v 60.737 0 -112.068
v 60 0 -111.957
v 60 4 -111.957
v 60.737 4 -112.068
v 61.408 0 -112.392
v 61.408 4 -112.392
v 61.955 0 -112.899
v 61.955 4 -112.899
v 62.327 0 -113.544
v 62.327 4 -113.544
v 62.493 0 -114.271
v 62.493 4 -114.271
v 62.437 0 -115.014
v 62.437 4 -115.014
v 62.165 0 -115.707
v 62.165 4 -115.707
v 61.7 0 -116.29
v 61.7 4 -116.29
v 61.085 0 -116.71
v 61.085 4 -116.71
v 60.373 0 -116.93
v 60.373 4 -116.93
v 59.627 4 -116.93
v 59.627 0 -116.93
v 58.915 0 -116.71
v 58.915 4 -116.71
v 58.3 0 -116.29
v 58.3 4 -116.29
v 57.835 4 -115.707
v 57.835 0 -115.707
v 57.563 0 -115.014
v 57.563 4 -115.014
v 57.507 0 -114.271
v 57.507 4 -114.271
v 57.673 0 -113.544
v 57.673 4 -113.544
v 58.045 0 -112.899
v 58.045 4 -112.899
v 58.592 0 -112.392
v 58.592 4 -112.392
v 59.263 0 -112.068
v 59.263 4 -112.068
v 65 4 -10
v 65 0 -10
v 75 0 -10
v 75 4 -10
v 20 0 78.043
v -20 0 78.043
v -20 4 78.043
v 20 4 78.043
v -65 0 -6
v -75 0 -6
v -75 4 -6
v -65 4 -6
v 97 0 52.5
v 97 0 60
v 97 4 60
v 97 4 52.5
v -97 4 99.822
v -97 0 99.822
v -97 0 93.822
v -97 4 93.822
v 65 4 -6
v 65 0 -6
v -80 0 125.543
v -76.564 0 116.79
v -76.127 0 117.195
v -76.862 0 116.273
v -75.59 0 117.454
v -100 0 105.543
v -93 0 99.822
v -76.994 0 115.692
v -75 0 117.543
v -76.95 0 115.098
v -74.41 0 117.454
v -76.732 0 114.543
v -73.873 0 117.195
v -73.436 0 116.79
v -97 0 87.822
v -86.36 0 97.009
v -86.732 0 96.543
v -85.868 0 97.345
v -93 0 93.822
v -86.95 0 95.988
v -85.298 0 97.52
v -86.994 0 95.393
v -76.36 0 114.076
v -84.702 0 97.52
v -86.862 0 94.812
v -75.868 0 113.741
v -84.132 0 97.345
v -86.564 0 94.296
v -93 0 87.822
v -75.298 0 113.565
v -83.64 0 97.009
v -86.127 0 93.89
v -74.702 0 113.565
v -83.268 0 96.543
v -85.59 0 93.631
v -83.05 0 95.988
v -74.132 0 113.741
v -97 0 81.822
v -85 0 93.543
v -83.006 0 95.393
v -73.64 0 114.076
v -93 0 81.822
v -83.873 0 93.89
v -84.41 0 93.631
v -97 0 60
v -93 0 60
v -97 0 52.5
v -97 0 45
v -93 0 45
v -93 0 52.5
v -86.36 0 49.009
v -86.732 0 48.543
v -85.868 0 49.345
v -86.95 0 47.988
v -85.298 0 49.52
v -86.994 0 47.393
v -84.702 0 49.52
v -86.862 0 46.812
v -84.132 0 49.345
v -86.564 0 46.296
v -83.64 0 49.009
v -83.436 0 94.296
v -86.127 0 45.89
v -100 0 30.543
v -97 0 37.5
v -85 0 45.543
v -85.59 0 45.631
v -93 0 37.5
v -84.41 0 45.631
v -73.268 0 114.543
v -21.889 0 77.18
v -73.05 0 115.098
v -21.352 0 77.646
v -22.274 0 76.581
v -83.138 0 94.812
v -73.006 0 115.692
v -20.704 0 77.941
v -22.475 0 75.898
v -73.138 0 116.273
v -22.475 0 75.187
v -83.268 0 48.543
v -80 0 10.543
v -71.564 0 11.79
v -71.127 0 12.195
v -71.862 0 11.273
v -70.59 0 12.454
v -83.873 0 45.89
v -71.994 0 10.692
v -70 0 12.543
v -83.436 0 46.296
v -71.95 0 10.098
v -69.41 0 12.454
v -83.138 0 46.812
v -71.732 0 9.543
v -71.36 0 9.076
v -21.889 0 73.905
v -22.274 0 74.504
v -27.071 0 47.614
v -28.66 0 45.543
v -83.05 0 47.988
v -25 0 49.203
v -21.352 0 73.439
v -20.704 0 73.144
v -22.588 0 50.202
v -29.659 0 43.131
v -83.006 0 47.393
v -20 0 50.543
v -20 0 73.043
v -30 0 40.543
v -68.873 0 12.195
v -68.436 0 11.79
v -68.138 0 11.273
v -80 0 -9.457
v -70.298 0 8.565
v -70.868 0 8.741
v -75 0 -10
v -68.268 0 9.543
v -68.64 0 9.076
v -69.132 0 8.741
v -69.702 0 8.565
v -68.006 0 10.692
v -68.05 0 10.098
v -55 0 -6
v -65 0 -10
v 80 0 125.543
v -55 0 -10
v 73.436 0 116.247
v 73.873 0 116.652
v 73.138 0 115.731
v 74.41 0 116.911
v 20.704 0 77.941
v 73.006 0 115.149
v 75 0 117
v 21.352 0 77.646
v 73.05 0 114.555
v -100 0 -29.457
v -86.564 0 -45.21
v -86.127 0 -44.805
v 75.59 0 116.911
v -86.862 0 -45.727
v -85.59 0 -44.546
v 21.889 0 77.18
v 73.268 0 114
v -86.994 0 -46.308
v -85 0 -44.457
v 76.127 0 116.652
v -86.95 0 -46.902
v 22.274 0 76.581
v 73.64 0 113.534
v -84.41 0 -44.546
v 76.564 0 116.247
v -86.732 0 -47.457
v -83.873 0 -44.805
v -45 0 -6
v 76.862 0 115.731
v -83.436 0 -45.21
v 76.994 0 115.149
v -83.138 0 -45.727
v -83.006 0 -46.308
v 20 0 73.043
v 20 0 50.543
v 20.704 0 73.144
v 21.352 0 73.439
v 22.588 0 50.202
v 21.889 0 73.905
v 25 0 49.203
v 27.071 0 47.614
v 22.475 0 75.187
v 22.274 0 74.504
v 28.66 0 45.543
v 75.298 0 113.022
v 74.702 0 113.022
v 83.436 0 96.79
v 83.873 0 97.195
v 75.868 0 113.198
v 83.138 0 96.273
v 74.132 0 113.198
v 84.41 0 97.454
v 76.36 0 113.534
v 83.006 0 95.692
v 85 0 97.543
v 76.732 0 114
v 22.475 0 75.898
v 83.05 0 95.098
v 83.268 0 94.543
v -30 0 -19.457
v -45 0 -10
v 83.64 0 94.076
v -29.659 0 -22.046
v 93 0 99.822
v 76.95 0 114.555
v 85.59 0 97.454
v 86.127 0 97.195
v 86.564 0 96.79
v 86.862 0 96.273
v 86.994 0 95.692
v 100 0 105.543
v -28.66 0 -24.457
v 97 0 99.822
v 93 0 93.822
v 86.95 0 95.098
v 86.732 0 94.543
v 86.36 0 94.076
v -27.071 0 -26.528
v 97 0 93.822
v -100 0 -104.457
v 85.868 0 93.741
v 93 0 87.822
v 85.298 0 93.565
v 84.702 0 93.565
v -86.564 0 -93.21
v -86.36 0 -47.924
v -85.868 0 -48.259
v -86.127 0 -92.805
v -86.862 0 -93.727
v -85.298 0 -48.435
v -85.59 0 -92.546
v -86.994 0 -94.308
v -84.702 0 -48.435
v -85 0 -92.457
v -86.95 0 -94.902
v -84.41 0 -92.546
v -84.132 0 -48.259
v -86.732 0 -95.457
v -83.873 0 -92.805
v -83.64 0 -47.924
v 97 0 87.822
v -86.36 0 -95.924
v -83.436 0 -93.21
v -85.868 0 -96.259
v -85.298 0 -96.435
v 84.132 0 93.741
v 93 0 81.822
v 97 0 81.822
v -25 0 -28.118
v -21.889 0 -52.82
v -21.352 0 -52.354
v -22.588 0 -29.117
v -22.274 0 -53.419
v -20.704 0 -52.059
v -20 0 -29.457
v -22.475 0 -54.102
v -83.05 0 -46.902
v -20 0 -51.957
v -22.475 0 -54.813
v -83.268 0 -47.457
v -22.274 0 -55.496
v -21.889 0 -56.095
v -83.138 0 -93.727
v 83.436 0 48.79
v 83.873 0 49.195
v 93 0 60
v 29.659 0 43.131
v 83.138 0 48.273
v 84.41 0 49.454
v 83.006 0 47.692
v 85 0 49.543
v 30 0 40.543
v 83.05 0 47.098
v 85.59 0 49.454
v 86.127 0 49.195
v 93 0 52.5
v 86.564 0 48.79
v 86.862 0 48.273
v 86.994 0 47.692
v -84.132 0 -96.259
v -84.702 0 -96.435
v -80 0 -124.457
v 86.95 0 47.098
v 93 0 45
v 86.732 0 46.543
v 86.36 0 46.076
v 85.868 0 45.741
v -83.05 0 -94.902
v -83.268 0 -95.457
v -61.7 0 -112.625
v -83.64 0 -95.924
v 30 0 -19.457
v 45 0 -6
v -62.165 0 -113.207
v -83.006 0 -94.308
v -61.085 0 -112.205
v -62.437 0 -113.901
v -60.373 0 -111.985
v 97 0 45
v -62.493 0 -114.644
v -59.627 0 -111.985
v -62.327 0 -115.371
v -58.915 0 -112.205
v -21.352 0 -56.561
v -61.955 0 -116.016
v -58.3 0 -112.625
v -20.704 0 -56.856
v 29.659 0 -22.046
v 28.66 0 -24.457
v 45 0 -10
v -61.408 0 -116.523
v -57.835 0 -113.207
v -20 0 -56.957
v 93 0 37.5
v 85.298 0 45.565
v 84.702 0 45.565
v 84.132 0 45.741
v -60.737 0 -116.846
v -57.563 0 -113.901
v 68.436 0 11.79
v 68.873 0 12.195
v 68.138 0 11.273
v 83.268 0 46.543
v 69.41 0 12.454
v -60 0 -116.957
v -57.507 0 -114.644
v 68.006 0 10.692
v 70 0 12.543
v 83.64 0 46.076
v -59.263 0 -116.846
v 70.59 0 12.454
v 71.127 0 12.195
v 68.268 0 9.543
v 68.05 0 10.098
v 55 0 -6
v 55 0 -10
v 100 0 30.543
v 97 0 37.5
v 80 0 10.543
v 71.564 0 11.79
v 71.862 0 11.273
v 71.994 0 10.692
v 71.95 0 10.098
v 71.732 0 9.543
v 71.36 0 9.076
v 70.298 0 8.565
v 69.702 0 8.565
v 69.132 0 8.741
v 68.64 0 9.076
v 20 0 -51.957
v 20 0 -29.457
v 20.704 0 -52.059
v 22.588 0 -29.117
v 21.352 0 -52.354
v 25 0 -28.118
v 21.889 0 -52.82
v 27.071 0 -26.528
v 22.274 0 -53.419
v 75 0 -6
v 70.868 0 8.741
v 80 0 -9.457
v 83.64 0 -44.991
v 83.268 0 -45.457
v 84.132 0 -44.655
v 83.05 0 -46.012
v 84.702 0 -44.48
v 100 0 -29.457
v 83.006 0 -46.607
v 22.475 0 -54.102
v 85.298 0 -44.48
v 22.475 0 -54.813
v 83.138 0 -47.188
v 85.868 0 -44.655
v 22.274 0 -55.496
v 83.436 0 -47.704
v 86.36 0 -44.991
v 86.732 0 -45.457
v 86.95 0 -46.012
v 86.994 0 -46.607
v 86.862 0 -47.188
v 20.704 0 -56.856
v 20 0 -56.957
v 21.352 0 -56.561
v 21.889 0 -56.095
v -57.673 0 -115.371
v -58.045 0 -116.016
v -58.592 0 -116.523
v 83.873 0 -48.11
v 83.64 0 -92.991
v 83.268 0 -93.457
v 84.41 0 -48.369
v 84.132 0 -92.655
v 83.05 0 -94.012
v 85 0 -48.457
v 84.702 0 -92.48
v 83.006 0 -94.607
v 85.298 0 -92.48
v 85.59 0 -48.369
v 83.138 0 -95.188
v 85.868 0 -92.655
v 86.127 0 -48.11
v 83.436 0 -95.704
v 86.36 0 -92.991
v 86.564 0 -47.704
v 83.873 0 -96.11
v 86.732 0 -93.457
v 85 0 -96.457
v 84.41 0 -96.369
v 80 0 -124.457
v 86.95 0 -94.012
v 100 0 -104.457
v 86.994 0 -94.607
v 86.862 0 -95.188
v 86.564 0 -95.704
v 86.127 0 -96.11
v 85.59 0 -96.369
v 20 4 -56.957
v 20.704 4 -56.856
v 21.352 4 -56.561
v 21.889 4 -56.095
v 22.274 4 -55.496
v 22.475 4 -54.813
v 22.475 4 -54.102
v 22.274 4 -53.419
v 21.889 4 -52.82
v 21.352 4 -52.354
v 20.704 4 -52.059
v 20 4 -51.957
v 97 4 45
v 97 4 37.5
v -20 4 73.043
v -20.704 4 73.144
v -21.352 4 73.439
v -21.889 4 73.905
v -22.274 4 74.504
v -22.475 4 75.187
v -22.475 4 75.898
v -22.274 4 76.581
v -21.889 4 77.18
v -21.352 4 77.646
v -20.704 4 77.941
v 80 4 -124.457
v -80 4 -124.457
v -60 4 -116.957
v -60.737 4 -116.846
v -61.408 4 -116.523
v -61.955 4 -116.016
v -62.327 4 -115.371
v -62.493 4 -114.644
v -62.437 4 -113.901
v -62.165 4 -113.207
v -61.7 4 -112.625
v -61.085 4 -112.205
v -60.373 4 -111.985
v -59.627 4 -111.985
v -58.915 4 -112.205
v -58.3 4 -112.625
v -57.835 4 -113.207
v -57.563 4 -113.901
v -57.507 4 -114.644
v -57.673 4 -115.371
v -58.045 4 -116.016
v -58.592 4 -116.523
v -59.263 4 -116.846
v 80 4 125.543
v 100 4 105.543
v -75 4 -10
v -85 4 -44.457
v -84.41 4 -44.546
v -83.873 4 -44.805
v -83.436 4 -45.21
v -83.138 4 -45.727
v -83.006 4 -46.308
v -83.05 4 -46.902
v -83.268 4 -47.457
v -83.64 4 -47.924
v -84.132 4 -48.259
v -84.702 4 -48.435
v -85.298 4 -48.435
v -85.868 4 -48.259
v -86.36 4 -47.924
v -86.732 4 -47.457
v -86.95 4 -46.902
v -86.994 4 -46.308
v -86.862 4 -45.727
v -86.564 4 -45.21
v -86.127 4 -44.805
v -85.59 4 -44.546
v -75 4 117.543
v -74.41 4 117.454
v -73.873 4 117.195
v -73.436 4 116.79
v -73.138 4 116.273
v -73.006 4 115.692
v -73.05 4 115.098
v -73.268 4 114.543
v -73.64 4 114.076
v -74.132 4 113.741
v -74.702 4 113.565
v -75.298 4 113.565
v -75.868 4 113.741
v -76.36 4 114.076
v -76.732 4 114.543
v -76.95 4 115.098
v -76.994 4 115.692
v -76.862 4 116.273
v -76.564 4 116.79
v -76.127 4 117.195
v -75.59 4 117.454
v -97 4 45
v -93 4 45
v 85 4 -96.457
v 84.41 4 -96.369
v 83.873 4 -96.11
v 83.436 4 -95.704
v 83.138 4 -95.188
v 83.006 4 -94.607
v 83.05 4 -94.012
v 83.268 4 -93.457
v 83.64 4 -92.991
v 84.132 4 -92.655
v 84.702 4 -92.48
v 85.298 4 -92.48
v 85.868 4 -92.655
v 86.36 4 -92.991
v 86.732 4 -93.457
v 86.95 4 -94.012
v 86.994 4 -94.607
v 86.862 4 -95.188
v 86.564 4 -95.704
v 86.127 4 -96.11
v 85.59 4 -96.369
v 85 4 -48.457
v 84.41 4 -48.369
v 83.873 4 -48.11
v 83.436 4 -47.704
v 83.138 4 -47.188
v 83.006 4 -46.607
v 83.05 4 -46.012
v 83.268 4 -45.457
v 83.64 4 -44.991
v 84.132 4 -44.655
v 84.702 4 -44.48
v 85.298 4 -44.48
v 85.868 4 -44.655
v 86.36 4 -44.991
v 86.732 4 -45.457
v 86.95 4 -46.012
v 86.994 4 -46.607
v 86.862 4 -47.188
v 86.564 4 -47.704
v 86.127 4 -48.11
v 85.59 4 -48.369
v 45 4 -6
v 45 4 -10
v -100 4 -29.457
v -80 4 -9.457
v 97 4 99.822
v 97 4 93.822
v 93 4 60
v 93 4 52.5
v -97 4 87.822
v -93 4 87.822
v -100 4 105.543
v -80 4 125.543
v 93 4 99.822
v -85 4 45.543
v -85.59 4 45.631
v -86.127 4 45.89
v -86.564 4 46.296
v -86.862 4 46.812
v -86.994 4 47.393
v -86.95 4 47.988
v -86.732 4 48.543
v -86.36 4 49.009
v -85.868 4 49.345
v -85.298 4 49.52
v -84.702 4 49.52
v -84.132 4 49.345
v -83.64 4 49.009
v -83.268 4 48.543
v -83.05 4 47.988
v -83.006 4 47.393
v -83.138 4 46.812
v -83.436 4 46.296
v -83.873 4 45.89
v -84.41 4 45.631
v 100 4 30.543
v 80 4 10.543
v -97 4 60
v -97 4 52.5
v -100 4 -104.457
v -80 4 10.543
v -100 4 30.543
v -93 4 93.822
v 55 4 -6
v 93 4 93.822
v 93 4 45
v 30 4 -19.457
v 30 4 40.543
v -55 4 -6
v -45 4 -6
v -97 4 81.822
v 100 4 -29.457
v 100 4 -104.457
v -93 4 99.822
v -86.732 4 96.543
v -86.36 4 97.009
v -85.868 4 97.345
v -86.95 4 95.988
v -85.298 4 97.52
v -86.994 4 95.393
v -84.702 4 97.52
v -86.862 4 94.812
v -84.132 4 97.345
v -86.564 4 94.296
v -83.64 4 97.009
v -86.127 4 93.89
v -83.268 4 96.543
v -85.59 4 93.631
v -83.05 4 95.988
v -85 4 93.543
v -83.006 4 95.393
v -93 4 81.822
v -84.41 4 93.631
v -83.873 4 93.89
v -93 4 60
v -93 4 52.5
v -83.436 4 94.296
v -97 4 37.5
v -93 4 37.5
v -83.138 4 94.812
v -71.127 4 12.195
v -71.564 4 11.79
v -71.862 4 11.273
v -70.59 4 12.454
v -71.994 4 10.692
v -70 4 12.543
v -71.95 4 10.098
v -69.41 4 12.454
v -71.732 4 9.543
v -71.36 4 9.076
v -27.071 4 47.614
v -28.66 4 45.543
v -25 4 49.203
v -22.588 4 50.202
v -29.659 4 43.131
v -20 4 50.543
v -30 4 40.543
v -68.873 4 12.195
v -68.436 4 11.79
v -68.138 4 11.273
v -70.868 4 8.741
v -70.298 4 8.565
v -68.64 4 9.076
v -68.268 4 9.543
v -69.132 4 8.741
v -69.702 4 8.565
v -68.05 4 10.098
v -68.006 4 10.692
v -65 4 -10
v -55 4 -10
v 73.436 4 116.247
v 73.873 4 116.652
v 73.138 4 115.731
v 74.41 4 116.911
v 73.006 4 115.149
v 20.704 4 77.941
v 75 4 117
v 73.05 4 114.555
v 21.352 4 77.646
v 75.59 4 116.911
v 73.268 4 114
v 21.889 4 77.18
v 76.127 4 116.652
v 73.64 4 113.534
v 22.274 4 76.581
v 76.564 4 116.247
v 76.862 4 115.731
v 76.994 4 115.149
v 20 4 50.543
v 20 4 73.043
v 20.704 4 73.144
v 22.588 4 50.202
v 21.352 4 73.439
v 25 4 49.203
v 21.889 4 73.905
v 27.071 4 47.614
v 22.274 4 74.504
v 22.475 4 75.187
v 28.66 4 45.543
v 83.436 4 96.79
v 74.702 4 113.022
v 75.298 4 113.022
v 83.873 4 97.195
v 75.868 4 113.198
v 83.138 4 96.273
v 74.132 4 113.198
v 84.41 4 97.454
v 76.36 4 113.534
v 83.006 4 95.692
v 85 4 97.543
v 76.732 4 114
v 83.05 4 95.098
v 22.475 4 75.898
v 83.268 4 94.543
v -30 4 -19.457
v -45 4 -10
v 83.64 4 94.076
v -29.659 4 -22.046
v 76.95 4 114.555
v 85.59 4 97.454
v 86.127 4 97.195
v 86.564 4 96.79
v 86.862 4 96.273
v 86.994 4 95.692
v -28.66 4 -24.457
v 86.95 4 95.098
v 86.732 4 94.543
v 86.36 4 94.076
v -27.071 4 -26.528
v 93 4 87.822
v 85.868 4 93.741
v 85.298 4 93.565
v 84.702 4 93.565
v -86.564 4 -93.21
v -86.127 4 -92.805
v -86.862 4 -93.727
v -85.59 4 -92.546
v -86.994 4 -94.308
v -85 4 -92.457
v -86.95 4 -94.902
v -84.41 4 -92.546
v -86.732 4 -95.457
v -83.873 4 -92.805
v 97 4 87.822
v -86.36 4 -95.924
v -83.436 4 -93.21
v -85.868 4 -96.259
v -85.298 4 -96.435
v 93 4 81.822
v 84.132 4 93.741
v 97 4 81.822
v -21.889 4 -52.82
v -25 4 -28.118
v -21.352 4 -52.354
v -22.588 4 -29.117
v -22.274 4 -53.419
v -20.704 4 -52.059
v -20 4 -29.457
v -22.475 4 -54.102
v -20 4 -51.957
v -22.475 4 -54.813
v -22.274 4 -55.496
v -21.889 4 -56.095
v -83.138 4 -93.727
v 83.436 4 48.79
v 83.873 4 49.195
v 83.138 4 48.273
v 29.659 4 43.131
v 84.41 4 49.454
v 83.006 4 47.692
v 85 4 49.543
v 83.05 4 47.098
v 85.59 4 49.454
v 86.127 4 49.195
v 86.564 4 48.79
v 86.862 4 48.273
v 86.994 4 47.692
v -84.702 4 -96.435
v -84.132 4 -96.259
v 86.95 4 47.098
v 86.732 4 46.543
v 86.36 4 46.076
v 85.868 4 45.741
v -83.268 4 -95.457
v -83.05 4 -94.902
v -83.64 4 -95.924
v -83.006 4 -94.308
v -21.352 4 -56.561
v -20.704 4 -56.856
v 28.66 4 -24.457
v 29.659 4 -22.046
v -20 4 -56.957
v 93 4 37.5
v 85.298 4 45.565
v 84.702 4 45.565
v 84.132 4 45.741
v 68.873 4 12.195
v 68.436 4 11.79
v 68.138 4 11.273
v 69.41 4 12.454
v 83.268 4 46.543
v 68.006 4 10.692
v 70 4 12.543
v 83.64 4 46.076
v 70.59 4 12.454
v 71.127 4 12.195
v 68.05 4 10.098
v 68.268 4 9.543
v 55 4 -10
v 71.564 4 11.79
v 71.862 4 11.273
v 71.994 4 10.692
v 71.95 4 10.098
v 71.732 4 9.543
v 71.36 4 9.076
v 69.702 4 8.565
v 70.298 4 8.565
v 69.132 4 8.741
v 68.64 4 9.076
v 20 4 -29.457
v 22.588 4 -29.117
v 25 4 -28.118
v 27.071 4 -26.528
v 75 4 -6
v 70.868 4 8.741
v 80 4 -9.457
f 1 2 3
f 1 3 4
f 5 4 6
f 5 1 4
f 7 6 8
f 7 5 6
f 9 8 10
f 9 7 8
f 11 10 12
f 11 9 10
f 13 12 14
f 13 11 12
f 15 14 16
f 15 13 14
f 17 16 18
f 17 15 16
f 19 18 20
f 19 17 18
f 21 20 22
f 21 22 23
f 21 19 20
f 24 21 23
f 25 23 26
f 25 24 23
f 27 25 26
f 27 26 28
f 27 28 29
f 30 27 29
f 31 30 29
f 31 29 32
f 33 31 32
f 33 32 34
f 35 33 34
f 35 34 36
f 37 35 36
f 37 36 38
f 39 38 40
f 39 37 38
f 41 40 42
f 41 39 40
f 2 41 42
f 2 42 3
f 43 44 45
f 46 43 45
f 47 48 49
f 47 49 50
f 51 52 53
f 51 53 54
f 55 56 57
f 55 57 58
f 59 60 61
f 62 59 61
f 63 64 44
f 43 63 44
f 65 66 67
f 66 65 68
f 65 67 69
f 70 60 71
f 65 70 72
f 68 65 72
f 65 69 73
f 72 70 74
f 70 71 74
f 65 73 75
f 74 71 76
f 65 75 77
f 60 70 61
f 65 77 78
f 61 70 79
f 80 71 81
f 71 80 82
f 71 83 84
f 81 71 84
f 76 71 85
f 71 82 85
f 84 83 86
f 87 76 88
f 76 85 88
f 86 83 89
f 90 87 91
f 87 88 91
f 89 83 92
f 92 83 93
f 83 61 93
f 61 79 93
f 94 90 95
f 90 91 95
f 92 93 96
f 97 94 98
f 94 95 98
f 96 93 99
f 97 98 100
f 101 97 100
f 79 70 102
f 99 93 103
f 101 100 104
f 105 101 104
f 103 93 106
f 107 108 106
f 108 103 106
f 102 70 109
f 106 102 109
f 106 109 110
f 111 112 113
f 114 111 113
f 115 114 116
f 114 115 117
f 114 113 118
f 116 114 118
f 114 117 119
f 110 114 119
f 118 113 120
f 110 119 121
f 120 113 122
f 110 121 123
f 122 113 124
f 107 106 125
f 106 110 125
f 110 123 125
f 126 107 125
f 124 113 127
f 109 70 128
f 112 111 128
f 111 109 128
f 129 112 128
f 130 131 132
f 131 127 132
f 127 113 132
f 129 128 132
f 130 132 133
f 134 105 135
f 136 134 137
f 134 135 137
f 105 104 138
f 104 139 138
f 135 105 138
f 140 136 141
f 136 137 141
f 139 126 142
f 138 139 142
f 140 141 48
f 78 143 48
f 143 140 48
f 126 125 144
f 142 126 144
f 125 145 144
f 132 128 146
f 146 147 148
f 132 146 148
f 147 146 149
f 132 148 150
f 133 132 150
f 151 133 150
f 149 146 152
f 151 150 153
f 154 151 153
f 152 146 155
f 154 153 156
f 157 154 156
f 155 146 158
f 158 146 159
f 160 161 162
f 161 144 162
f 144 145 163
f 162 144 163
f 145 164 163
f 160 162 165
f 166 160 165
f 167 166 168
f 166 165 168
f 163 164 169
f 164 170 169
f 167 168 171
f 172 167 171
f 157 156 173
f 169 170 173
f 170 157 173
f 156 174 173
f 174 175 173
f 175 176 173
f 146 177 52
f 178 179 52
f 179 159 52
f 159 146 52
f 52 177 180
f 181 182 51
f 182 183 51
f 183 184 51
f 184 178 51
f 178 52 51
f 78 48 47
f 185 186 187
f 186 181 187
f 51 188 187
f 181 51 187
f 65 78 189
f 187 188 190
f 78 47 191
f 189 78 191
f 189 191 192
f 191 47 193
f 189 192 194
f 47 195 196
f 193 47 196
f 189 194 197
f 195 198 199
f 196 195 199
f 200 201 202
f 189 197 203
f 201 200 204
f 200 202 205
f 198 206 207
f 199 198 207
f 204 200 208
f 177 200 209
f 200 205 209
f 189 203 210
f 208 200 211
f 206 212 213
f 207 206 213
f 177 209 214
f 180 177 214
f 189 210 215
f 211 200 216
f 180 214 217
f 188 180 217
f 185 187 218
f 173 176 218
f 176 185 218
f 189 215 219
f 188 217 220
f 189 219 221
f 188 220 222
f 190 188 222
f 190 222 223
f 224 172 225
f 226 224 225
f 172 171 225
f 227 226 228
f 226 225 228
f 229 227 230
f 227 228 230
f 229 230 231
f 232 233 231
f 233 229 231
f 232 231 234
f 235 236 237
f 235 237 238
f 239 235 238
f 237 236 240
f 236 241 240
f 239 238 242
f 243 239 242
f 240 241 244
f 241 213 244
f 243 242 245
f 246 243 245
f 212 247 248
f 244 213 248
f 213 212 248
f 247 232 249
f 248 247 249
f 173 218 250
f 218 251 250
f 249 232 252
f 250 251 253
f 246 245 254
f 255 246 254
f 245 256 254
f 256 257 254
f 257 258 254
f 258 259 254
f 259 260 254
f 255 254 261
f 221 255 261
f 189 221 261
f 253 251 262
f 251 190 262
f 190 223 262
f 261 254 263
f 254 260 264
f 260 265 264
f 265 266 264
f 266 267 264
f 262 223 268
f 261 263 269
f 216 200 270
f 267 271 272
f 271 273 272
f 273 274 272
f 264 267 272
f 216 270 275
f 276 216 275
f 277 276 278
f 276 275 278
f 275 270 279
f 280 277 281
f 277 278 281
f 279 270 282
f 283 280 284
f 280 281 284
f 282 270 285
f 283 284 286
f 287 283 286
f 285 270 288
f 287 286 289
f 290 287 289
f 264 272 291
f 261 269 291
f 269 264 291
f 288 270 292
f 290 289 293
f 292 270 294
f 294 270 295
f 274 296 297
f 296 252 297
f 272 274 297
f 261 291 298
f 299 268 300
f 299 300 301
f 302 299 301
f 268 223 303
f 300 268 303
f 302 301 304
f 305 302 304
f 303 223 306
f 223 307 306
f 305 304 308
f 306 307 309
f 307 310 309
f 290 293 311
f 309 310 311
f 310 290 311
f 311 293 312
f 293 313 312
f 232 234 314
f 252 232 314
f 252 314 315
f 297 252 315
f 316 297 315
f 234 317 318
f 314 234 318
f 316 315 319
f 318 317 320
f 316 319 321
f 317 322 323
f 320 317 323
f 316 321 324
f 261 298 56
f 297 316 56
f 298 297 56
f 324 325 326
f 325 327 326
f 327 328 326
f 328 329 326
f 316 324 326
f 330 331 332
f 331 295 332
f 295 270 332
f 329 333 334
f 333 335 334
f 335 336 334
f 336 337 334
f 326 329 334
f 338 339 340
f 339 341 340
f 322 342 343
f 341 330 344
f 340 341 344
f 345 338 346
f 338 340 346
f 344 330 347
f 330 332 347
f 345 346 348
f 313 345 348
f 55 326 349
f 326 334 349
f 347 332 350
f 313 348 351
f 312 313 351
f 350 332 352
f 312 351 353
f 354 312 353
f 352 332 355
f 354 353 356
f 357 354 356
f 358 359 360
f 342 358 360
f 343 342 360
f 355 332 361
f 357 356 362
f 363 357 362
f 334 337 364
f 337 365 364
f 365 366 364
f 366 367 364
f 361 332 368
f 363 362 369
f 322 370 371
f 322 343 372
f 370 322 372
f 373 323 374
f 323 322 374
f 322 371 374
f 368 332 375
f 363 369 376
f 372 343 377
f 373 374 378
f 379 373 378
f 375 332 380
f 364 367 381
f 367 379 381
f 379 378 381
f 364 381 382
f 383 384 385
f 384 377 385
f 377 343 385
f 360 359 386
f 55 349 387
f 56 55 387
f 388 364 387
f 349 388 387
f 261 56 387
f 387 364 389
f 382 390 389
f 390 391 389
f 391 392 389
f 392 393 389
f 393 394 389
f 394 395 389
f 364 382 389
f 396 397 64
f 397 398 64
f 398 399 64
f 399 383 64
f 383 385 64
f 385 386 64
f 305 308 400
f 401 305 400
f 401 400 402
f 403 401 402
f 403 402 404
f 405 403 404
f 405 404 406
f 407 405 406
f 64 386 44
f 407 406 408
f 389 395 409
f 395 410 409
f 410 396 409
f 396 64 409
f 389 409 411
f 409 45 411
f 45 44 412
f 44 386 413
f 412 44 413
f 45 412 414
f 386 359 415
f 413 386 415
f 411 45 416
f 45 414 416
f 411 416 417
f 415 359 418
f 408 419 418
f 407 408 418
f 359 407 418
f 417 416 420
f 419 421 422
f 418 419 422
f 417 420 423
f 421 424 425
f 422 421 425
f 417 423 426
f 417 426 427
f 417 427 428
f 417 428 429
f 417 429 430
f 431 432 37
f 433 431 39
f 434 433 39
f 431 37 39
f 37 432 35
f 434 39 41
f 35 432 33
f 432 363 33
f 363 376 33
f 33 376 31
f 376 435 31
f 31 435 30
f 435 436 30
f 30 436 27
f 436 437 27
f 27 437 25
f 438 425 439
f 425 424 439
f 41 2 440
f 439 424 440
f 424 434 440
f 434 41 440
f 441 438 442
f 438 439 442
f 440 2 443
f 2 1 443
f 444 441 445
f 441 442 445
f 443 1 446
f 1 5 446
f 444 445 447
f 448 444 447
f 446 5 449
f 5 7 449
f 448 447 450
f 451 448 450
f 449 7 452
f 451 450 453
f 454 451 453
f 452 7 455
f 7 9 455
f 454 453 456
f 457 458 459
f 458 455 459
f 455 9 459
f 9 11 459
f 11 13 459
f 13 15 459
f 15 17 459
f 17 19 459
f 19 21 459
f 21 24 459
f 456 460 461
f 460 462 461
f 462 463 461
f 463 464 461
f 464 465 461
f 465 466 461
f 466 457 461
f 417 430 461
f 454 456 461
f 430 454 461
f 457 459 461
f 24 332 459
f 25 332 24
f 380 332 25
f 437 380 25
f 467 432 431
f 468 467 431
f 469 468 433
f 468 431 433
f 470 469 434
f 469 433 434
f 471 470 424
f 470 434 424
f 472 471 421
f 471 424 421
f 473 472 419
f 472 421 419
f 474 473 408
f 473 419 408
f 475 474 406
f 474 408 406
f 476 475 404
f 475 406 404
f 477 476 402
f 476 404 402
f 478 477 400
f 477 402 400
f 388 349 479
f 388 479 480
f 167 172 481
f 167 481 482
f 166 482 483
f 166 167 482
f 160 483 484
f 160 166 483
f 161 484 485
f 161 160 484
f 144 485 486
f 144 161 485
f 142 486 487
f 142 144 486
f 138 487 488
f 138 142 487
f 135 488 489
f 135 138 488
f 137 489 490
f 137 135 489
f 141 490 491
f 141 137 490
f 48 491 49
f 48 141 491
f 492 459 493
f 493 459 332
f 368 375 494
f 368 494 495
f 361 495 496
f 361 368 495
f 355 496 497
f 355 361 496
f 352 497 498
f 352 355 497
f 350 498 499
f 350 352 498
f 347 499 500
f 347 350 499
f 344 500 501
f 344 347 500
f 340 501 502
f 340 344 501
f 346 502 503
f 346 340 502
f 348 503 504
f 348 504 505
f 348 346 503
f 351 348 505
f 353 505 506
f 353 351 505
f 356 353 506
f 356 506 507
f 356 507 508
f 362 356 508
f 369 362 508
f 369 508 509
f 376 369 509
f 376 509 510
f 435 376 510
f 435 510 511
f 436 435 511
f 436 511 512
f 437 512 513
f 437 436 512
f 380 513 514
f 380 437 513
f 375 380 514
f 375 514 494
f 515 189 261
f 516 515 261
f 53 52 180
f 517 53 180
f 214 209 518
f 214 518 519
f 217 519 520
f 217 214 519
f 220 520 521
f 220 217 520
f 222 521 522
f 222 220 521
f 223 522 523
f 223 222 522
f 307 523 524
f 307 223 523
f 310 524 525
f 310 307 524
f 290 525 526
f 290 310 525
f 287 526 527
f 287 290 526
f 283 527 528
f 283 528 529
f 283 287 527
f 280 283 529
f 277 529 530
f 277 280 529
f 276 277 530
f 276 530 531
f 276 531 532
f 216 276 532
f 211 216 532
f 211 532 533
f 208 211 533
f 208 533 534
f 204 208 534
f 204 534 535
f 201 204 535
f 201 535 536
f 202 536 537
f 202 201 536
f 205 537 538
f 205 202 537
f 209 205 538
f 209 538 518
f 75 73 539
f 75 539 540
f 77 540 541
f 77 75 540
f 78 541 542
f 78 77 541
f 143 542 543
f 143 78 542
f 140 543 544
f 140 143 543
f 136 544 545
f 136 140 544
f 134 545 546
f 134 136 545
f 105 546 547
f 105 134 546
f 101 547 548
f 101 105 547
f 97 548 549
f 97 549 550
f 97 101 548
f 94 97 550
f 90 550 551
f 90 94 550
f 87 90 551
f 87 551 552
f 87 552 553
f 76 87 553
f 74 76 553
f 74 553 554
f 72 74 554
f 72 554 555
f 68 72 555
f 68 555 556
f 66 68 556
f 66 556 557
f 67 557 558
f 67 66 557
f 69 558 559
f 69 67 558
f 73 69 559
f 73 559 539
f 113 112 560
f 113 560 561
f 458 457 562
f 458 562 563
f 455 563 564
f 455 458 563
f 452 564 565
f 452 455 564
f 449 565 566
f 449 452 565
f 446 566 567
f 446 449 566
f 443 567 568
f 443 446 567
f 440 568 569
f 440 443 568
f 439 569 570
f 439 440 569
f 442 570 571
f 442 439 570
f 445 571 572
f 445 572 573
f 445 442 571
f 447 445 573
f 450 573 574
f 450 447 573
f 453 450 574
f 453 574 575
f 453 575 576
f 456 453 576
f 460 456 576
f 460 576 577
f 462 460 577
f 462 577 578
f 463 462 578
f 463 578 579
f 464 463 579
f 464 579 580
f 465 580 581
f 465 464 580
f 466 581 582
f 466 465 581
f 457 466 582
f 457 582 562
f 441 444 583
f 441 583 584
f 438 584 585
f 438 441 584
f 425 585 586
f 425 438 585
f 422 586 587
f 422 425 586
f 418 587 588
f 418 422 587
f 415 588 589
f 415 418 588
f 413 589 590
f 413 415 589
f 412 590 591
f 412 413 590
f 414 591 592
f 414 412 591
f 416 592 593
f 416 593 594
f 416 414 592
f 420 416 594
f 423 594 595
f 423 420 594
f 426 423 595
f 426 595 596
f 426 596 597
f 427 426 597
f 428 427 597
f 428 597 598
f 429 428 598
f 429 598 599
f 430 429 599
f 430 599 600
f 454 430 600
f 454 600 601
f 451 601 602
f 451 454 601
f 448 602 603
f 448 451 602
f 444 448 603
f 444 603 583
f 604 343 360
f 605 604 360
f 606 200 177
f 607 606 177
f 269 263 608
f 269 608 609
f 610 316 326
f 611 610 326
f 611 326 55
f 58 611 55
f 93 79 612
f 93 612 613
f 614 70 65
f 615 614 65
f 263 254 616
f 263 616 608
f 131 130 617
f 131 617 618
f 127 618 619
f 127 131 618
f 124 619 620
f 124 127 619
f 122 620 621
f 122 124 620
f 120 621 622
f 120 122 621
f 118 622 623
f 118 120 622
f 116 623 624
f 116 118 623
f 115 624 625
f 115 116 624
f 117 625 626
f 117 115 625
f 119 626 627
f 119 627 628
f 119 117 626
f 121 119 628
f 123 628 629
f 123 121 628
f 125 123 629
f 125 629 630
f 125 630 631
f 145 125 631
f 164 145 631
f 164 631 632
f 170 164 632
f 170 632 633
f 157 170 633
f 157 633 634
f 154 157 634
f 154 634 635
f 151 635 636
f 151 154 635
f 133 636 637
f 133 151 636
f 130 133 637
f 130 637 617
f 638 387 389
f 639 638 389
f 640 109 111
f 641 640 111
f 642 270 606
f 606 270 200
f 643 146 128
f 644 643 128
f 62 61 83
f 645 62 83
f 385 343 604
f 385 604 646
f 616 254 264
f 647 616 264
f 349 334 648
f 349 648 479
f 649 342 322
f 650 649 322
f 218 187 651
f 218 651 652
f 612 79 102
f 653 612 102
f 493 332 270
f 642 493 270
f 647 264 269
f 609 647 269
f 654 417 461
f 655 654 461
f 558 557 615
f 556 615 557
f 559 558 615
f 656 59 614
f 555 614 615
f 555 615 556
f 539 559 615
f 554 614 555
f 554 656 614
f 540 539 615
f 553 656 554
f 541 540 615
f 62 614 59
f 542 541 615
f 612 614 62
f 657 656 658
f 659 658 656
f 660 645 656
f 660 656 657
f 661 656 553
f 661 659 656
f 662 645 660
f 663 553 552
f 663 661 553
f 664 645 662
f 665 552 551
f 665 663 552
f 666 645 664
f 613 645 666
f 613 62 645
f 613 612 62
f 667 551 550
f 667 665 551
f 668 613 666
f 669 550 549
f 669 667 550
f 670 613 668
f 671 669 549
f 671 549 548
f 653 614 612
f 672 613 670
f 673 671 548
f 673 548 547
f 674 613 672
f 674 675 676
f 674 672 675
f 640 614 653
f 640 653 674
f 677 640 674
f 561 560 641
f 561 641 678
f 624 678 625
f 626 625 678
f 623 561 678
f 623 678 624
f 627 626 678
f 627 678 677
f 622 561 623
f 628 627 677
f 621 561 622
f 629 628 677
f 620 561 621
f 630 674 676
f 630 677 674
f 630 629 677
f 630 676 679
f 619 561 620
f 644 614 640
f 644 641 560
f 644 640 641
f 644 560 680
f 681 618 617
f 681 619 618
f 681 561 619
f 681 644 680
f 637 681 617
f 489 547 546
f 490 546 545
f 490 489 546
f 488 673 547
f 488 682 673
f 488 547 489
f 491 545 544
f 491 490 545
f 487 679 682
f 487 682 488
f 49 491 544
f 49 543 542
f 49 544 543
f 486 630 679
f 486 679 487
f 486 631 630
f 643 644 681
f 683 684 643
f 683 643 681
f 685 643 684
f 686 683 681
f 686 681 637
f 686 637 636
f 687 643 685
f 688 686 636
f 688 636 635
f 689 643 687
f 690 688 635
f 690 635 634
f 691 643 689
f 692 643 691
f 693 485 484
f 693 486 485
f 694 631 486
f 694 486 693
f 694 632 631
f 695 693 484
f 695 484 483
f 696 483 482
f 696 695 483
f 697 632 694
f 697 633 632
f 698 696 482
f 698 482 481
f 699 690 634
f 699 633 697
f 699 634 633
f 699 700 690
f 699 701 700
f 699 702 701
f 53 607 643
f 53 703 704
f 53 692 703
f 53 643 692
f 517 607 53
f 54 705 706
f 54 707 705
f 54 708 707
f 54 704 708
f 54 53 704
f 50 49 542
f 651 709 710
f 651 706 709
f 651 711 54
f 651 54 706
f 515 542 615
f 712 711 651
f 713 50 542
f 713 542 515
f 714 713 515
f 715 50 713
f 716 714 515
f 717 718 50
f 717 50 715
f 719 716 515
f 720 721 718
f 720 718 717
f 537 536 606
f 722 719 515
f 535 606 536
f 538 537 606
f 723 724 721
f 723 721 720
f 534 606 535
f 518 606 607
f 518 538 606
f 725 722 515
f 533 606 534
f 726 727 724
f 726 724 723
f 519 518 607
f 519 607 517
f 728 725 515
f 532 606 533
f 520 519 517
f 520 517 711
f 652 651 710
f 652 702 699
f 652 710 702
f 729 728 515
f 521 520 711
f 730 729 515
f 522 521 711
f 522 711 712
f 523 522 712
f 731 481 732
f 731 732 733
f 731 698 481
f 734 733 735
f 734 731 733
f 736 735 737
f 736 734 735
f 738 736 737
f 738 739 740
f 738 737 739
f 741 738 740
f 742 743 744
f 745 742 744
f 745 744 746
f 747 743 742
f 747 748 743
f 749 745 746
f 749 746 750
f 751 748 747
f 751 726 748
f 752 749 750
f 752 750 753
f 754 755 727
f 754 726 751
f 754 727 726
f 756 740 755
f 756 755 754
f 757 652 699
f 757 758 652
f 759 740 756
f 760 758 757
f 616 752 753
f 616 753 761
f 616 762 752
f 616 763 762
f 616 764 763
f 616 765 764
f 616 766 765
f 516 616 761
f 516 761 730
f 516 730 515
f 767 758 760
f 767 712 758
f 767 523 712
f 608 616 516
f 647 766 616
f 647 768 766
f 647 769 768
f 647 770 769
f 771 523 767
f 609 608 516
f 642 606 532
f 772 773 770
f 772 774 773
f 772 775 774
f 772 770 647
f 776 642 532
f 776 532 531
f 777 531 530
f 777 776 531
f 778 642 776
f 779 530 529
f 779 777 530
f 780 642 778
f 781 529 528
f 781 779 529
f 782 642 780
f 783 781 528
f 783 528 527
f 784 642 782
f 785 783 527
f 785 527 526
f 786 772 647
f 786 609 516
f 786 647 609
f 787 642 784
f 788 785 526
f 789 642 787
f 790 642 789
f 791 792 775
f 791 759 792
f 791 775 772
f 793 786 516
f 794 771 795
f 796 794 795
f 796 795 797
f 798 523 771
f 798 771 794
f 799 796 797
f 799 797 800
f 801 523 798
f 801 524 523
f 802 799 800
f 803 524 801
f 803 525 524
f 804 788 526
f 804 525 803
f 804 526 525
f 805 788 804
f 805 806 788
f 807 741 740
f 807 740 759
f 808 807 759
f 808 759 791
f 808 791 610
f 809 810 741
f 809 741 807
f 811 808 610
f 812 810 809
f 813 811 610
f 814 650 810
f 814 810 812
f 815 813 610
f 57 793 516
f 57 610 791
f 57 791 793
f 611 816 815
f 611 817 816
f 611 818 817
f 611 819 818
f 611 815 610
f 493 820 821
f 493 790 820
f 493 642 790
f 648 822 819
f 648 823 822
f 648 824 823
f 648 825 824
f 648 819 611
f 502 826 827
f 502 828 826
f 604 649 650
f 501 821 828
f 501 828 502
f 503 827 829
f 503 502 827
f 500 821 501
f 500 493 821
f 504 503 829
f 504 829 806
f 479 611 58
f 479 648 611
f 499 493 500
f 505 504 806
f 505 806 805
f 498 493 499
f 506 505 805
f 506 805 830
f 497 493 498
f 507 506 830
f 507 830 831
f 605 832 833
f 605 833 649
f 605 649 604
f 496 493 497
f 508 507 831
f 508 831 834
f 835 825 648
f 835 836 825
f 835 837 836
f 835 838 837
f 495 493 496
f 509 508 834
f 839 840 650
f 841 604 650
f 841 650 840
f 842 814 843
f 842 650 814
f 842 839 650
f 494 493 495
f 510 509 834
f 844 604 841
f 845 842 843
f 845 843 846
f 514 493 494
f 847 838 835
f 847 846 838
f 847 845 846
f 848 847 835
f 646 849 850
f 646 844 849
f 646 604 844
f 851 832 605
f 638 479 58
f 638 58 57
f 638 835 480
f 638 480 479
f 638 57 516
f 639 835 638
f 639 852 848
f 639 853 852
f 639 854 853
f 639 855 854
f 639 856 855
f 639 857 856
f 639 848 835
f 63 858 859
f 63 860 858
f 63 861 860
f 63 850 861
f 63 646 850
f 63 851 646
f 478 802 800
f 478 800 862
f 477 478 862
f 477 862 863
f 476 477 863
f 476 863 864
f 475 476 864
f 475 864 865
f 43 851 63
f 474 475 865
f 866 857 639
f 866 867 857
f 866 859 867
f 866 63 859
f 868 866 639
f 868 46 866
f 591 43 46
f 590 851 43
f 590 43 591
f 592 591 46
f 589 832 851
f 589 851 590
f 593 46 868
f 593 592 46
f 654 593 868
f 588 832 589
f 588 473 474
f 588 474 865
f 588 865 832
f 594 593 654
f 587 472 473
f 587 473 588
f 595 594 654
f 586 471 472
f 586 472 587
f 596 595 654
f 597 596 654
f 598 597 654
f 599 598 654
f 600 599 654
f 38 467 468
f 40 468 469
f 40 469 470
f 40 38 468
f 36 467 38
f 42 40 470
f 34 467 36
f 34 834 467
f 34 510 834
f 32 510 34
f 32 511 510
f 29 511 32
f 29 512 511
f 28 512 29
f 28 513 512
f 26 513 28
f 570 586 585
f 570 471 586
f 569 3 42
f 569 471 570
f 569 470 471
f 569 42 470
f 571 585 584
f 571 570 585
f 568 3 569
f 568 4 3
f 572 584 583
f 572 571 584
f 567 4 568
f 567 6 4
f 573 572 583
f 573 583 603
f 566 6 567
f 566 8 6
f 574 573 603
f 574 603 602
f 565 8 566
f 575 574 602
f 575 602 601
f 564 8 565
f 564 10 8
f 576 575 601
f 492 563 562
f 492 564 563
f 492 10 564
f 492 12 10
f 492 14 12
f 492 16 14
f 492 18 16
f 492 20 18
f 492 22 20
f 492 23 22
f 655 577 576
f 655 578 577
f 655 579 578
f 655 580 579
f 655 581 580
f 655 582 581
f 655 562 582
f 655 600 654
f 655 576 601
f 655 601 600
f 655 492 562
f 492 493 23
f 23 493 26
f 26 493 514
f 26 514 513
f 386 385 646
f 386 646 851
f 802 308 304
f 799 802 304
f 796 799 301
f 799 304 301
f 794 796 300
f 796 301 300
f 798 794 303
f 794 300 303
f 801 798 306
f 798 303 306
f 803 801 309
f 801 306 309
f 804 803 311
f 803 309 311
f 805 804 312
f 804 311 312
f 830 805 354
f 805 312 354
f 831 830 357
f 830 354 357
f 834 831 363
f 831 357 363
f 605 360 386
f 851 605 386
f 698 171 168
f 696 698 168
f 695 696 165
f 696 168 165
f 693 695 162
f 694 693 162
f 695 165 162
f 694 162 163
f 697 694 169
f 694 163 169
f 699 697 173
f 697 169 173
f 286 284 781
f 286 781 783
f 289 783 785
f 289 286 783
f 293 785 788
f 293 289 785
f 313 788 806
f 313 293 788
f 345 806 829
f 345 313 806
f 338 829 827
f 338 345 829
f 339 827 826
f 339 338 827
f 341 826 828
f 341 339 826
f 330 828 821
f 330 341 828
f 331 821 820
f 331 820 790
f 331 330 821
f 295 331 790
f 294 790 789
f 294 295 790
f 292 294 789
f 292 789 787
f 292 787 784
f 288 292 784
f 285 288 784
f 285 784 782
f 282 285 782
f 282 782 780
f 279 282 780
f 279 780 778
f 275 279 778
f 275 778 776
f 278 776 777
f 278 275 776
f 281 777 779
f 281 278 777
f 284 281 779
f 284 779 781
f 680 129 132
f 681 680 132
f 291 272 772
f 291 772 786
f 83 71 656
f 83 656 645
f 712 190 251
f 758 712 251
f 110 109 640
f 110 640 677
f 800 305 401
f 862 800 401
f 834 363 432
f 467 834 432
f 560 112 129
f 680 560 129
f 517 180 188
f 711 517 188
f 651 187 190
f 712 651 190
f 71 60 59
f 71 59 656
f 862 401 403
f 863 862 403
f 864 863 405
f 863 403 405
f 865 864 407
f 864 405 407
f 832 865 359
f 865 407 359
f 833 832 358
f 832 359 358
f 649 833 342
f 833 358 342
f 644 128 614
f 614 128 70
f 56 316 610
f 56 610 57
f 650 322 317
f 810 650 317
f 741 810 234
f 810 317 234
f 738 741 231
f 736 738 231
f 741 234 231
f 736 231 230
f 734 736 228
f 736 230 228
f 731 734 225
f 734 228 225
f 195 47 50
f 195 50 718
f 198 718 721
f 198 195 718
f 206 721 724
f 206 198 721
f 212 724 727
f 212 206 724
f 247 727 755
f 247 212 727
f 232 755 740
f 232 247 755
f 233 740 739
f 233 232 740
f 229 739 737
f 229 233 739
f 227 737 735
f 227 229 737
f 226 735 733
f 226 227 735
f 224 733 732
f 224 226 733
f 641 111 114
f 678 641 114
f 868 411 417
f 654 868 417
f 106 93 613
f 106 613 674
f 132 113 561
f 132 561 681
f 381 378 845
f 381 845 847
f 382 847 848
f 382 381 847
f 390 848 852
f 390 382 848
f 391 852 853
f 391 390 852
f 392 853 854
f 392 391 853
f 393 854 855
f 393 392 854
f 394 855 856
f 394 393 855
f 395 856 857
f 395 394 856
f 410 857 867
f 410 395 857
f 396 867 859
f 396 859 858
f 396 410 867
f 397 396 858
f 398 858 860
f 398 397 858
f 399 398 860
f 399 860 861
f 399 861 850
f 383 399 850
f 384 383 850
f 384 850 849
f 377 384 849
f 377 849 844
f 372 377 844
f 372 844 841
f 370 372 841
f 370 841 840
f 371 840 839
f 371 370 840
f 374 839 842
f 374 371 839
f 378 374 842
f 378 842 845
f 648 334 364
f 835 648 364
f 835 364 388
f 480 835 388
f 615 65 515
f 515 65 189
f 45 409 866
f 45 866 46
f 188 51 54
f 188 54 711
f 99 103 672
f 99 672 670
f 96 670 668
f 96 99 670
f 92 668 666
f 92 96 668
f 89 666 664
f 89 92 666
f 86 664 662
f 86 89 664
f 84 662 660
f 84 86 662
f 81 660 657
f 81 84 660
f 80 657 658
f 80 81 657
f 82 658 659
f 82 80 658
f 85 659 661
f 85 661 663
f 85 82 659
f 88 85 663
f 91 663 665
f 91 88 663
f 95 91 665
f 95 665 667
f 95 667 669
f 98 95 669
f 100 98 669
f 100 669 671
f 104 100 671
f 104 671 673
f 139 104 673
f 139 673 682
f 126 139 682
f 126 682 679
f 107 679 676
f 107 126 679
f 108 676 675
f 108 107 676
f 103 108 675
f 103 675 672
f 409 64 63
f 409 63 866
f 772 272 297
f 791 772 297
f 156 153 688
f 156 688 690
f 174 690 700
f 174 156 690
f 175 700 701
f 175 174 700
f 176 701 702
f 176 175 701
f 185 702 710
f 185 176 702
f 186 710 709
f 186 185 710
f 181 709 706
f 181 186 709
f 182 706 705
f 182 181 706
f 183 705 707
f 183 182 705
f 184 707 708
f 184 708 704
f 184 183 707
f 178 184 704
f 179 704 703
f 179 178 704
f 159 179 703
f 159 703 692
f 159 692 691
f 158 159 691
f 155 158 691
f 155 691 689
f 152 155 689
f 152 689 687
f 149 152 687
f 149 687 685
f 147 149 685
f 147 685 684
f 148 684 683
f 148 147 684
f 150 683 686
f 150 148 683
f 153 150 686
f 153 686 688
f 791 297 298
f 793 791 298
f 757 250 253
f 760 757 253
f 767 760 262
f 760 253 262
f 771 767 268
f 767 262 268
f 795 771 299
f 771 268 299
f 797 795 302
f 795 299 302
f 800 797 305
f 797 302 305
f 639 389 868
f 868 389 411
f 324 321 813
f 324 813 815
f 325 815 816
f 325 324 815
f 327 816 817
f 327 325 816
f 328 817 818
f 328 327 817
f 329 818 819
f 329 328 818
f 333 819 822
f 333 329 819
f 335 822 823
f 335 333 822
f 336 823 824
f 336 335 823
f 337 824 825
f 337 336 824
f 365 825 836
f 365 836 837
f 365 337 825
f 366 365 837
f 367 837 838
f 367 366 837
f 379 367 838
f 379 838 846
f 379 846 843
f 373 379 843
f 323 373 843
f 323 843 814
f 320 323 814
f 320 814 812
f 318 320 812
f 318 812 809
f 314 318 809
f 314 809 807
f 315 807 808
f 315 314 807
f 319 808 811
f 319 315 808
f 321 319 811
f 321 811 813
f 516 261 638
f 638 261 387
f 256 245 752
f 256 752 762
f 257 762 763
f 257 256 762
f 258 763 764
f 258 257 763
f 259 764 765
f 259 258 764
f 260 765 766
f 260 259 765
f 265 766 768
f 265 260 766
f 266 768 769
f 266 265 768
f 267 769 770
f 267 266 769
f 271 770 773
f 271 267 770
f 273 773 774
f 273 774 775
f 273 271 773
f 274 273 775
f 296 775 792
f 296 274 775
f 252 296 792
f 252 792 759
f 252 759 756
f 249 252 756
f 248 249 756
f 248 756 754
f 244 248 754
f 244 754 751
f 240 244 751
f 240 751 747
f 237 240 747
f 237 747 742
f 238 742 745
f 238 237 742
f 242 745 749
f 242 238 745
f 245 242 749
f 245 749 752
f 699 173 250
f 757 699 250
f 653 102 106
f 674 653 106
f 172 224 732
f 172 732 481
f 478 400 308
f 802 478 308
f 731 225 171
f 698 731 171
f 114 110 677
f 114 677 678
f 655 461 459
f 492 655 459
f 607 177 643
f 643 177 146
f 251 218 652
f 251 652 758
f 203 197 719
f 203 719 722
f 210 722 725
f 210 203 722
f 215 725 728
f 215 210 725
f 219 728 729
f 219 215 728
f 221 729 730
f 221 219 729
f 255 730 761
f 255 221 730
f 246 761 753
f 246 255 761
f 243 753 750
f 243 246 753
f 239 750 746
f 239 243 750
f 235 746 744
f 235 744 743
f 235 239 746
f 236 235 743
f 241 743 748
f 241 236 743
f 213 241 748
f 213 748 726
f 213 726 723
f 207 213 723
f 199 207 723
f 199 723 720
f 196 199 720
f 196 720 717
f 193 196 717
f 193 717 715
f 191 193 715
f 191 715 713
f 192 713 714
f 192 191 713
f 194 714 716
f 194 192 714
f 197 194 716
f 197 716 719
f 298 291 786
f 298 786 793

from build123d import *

# Parameters (mm, degrees)
SKETCH1_R           = 2
SKETCH1_R_2         = 2.5
SKETCH1_W           = 4
SKETCH1_H           = 7.5
SKETCH1_H_2         = 6
SKETCH1_W_2         = 10
SKETCH1_H_3         = 4
BOSS_EXTRUDE1_DEPTH = 4


with BuildPart() as part:
    # Sketch1 → Boss-Extrude1 (new body)
    with BuildSketch(Plane(origin=(0, 0, 0), x_dir=(1, 0, 0), z_dir=(0, 1, 0))):
        Polygon((80, 124.45742592), (-80, 124.45742592), (-100, 104.45742592), (-100, 29.45742592), (-80, 9.45742592), (-80, -10.54257408), (-100, -30.54257408), (-100, -105.54257408), (-80, -125.54257408), (80, -125.54257408), (100, -105.54257408), (100, -30.54257408), (80, -10.54257408), (80, 9.45742592), (100, 29.45742592), (100, 104.45742592), align=None)
        with Locations(Location((-85, 94.45742592, 0), (0, 0, 270))):
            Circle(SKETCH1_R, mode=Mode.SUBTRACT)
        with Locations(Location((-85, 46.45742592, 0), (0, 0, 270))):
            Circle(SKETCH1_R, mode=Mode.SUBTRACT)
        with Locations(Location((85, 94.45742592, 0), (0, 0, 90))):
            Circle(SKETCH1_R, mode=Mode.SUBTRACT)
        with Locations(Location((85, 46.45742592, 0), (0, 0, 90))):
            Circle(SKETCH1_R, mode=Mode.SUBTRACT)
        with Locations(Location((85, -47.54257408, 0), (0, 0, 270))):
            Circle(SKETCH1_R, mode=Mode.SUBTRACT)
        with Locations(Location((85, -95.54257408, 0), (0, 0, 270))):
            Circle(SKETCH1_R, mode=Mode.SUBTRACT)
        with Locations(Location((-85, -47.54257408, 0), (0, 0, 90))):
            Circle(SKETCH1_R, mode=Mode.SUBTRACT)
        with Locations(Location((-85, -95.54257408, 0), (0, 0, 90))):
            Circle(SKETCH1_R, mode=Mode.SUBTRACT)
        with Locations(Location((60, 114.45742592, 0), (0, 0, 270))):
            Circle(SKETCH1_R_2, mode=Mode.SUBTRACT)
        with Locations(Location((-60, 114.45742592, 0), (0, 0, 90))):
            Circle(SKETCH1_R_2, mode=Mode.SUBTRACT)
        with Locations(Location((-75, -115.54257408, 0), (0, 0, 270))):
            Circle(SKETCH1_R, mode=Mode.SUBTRACT)
        with Locations(Location((-70, -10.54257408, 0), (0, 0, 270))):
            Circle(SKETCH1_R, mode=Mode.SUBTRACT)
        with Locations(Location((75, -115, 0), (0, 0, 270))):
            Circle(SKETCH1_R, mode=Mode.SUBTRACT)
        with Locations(Location((70, -10.54257408, 0), (0, 0, 270))):
            Circle(SKETCH1_R, mode=Mode.SUBTRACT)
        with BuildLine():
            Line((-20, 29.45742592), (20, 29.45742592))
            ThreePointArc((20, 29.45742592), (27.071067812, 26.528493731), (30, 19.45742592))
            Line((30, 19.45742592), (30, -40.54257408))
            ThreePointArc((30, -40.54257408), (27.071067812, -47.613641892), (20, -50.54257408))
            Line((20, -50.54257408), (-20, -50.54257408))
            ThreePointArc((-20, -50.54257408), (-27.071067812, -47.613641892), (-30, -40.54257408))
            Line((-30, -40.54257408), (-30, 19.45742592))
            ThreePointArc((-30, 19.45742592), (-27.071067812, 26.528493731), (-20, 29.45742592))
        make_face(mode=Mode.SUBTRACT)
        with BuildLine():
            Line((20, -73.04257408), (-20, -73.04257408))
            ThreePointArc((-20, -73.04257408), (-22.5, -75.54257408), (-20, -78.04257408))
            Line((-20, -78.04257408), (20, -78.04257408))
            ThreePointArc((20, -78.04257408), (22.5, -75.54257408), (20, -73.04257408))
        make_face(mode=Mode.SUBTRACT)
        with Locations((95, -41.25)):
            Rectangle(SKETCH1_W, SKETCH1_H, mode=Mode.SUBTRACT)
        with Locations((95, -96.822248533)):
            Rectangle(SKETCH1_W, SKETCH1_H_2, mode=Mode.SUBTRACT)
        with Locations((70, 8)):
            Rectangle(SKETCH1_W_2, SKETCH1_H_3, mode=Mode.SUBTRACT)
        with Locations((95, -56.25)):
            Rectangle(SKETCH1_W, SKETCH1_H, mode=Mode.SUBTRACT)
        with Locations((50, 8)):
            Rectangle(SKETCH1_W_2, SKETCH1_H_3, mode=Mode.SUBTRACT)
        with Locations((95, -84.822248533)):
            Rectangle(SKETCH1_W, SKETCH1_H_2, mode=Mode.SUBTRACT)
        with Locations((-95, -96.822248533)):
            Rectangle(SKETCH1_W, SKETCH1_H_2, mode=Mode.SUBTRACT)
        with Locations((-95, -84.822248533)):
            Rectangle(SKETCH1_W, SKETCH1_H_2, mode=Mode.SUBTRACT)
        with Locations((-95, -56.25)):
            Rectangle(SKETCH1_W, SKETCH1_H, mode=Mode.SUBTRACT)
        with Locations((-95, -41.25)):
            Rectangle(SKETCH1_W, SKETCH1_H, mode=Mode.SUBTRACT)
        with Locations((-50, 8)):
            Rectangle(SKETCH1_W_2, SKETCH1_H_3, mode=Mode.SUBTRACT)
        with Locations((-70, 8)):
            Rectangle(SKETCH1_W_2, SKETCH1_H_3, mode=Mode.SUBTRACT)
        with BuildLine():
            Line((20, 51.95742592), (-20, 51.95742592))
            ThreePointArc((-20, 51.95742592), (-22.5, 54.45742592), (-20, 56.95742592))
            Line((-20, 56.95742592), (20, 56.95742592))
            ThreePointArc((20, 56.95742592), (22.5, 54.45742592), (20, 51.95742592))
        make_face(mode=Mode.SUBTRACT)
    extrude(amount=BOSS_EXTRUDE1_DEPTH)


solid = part.part
